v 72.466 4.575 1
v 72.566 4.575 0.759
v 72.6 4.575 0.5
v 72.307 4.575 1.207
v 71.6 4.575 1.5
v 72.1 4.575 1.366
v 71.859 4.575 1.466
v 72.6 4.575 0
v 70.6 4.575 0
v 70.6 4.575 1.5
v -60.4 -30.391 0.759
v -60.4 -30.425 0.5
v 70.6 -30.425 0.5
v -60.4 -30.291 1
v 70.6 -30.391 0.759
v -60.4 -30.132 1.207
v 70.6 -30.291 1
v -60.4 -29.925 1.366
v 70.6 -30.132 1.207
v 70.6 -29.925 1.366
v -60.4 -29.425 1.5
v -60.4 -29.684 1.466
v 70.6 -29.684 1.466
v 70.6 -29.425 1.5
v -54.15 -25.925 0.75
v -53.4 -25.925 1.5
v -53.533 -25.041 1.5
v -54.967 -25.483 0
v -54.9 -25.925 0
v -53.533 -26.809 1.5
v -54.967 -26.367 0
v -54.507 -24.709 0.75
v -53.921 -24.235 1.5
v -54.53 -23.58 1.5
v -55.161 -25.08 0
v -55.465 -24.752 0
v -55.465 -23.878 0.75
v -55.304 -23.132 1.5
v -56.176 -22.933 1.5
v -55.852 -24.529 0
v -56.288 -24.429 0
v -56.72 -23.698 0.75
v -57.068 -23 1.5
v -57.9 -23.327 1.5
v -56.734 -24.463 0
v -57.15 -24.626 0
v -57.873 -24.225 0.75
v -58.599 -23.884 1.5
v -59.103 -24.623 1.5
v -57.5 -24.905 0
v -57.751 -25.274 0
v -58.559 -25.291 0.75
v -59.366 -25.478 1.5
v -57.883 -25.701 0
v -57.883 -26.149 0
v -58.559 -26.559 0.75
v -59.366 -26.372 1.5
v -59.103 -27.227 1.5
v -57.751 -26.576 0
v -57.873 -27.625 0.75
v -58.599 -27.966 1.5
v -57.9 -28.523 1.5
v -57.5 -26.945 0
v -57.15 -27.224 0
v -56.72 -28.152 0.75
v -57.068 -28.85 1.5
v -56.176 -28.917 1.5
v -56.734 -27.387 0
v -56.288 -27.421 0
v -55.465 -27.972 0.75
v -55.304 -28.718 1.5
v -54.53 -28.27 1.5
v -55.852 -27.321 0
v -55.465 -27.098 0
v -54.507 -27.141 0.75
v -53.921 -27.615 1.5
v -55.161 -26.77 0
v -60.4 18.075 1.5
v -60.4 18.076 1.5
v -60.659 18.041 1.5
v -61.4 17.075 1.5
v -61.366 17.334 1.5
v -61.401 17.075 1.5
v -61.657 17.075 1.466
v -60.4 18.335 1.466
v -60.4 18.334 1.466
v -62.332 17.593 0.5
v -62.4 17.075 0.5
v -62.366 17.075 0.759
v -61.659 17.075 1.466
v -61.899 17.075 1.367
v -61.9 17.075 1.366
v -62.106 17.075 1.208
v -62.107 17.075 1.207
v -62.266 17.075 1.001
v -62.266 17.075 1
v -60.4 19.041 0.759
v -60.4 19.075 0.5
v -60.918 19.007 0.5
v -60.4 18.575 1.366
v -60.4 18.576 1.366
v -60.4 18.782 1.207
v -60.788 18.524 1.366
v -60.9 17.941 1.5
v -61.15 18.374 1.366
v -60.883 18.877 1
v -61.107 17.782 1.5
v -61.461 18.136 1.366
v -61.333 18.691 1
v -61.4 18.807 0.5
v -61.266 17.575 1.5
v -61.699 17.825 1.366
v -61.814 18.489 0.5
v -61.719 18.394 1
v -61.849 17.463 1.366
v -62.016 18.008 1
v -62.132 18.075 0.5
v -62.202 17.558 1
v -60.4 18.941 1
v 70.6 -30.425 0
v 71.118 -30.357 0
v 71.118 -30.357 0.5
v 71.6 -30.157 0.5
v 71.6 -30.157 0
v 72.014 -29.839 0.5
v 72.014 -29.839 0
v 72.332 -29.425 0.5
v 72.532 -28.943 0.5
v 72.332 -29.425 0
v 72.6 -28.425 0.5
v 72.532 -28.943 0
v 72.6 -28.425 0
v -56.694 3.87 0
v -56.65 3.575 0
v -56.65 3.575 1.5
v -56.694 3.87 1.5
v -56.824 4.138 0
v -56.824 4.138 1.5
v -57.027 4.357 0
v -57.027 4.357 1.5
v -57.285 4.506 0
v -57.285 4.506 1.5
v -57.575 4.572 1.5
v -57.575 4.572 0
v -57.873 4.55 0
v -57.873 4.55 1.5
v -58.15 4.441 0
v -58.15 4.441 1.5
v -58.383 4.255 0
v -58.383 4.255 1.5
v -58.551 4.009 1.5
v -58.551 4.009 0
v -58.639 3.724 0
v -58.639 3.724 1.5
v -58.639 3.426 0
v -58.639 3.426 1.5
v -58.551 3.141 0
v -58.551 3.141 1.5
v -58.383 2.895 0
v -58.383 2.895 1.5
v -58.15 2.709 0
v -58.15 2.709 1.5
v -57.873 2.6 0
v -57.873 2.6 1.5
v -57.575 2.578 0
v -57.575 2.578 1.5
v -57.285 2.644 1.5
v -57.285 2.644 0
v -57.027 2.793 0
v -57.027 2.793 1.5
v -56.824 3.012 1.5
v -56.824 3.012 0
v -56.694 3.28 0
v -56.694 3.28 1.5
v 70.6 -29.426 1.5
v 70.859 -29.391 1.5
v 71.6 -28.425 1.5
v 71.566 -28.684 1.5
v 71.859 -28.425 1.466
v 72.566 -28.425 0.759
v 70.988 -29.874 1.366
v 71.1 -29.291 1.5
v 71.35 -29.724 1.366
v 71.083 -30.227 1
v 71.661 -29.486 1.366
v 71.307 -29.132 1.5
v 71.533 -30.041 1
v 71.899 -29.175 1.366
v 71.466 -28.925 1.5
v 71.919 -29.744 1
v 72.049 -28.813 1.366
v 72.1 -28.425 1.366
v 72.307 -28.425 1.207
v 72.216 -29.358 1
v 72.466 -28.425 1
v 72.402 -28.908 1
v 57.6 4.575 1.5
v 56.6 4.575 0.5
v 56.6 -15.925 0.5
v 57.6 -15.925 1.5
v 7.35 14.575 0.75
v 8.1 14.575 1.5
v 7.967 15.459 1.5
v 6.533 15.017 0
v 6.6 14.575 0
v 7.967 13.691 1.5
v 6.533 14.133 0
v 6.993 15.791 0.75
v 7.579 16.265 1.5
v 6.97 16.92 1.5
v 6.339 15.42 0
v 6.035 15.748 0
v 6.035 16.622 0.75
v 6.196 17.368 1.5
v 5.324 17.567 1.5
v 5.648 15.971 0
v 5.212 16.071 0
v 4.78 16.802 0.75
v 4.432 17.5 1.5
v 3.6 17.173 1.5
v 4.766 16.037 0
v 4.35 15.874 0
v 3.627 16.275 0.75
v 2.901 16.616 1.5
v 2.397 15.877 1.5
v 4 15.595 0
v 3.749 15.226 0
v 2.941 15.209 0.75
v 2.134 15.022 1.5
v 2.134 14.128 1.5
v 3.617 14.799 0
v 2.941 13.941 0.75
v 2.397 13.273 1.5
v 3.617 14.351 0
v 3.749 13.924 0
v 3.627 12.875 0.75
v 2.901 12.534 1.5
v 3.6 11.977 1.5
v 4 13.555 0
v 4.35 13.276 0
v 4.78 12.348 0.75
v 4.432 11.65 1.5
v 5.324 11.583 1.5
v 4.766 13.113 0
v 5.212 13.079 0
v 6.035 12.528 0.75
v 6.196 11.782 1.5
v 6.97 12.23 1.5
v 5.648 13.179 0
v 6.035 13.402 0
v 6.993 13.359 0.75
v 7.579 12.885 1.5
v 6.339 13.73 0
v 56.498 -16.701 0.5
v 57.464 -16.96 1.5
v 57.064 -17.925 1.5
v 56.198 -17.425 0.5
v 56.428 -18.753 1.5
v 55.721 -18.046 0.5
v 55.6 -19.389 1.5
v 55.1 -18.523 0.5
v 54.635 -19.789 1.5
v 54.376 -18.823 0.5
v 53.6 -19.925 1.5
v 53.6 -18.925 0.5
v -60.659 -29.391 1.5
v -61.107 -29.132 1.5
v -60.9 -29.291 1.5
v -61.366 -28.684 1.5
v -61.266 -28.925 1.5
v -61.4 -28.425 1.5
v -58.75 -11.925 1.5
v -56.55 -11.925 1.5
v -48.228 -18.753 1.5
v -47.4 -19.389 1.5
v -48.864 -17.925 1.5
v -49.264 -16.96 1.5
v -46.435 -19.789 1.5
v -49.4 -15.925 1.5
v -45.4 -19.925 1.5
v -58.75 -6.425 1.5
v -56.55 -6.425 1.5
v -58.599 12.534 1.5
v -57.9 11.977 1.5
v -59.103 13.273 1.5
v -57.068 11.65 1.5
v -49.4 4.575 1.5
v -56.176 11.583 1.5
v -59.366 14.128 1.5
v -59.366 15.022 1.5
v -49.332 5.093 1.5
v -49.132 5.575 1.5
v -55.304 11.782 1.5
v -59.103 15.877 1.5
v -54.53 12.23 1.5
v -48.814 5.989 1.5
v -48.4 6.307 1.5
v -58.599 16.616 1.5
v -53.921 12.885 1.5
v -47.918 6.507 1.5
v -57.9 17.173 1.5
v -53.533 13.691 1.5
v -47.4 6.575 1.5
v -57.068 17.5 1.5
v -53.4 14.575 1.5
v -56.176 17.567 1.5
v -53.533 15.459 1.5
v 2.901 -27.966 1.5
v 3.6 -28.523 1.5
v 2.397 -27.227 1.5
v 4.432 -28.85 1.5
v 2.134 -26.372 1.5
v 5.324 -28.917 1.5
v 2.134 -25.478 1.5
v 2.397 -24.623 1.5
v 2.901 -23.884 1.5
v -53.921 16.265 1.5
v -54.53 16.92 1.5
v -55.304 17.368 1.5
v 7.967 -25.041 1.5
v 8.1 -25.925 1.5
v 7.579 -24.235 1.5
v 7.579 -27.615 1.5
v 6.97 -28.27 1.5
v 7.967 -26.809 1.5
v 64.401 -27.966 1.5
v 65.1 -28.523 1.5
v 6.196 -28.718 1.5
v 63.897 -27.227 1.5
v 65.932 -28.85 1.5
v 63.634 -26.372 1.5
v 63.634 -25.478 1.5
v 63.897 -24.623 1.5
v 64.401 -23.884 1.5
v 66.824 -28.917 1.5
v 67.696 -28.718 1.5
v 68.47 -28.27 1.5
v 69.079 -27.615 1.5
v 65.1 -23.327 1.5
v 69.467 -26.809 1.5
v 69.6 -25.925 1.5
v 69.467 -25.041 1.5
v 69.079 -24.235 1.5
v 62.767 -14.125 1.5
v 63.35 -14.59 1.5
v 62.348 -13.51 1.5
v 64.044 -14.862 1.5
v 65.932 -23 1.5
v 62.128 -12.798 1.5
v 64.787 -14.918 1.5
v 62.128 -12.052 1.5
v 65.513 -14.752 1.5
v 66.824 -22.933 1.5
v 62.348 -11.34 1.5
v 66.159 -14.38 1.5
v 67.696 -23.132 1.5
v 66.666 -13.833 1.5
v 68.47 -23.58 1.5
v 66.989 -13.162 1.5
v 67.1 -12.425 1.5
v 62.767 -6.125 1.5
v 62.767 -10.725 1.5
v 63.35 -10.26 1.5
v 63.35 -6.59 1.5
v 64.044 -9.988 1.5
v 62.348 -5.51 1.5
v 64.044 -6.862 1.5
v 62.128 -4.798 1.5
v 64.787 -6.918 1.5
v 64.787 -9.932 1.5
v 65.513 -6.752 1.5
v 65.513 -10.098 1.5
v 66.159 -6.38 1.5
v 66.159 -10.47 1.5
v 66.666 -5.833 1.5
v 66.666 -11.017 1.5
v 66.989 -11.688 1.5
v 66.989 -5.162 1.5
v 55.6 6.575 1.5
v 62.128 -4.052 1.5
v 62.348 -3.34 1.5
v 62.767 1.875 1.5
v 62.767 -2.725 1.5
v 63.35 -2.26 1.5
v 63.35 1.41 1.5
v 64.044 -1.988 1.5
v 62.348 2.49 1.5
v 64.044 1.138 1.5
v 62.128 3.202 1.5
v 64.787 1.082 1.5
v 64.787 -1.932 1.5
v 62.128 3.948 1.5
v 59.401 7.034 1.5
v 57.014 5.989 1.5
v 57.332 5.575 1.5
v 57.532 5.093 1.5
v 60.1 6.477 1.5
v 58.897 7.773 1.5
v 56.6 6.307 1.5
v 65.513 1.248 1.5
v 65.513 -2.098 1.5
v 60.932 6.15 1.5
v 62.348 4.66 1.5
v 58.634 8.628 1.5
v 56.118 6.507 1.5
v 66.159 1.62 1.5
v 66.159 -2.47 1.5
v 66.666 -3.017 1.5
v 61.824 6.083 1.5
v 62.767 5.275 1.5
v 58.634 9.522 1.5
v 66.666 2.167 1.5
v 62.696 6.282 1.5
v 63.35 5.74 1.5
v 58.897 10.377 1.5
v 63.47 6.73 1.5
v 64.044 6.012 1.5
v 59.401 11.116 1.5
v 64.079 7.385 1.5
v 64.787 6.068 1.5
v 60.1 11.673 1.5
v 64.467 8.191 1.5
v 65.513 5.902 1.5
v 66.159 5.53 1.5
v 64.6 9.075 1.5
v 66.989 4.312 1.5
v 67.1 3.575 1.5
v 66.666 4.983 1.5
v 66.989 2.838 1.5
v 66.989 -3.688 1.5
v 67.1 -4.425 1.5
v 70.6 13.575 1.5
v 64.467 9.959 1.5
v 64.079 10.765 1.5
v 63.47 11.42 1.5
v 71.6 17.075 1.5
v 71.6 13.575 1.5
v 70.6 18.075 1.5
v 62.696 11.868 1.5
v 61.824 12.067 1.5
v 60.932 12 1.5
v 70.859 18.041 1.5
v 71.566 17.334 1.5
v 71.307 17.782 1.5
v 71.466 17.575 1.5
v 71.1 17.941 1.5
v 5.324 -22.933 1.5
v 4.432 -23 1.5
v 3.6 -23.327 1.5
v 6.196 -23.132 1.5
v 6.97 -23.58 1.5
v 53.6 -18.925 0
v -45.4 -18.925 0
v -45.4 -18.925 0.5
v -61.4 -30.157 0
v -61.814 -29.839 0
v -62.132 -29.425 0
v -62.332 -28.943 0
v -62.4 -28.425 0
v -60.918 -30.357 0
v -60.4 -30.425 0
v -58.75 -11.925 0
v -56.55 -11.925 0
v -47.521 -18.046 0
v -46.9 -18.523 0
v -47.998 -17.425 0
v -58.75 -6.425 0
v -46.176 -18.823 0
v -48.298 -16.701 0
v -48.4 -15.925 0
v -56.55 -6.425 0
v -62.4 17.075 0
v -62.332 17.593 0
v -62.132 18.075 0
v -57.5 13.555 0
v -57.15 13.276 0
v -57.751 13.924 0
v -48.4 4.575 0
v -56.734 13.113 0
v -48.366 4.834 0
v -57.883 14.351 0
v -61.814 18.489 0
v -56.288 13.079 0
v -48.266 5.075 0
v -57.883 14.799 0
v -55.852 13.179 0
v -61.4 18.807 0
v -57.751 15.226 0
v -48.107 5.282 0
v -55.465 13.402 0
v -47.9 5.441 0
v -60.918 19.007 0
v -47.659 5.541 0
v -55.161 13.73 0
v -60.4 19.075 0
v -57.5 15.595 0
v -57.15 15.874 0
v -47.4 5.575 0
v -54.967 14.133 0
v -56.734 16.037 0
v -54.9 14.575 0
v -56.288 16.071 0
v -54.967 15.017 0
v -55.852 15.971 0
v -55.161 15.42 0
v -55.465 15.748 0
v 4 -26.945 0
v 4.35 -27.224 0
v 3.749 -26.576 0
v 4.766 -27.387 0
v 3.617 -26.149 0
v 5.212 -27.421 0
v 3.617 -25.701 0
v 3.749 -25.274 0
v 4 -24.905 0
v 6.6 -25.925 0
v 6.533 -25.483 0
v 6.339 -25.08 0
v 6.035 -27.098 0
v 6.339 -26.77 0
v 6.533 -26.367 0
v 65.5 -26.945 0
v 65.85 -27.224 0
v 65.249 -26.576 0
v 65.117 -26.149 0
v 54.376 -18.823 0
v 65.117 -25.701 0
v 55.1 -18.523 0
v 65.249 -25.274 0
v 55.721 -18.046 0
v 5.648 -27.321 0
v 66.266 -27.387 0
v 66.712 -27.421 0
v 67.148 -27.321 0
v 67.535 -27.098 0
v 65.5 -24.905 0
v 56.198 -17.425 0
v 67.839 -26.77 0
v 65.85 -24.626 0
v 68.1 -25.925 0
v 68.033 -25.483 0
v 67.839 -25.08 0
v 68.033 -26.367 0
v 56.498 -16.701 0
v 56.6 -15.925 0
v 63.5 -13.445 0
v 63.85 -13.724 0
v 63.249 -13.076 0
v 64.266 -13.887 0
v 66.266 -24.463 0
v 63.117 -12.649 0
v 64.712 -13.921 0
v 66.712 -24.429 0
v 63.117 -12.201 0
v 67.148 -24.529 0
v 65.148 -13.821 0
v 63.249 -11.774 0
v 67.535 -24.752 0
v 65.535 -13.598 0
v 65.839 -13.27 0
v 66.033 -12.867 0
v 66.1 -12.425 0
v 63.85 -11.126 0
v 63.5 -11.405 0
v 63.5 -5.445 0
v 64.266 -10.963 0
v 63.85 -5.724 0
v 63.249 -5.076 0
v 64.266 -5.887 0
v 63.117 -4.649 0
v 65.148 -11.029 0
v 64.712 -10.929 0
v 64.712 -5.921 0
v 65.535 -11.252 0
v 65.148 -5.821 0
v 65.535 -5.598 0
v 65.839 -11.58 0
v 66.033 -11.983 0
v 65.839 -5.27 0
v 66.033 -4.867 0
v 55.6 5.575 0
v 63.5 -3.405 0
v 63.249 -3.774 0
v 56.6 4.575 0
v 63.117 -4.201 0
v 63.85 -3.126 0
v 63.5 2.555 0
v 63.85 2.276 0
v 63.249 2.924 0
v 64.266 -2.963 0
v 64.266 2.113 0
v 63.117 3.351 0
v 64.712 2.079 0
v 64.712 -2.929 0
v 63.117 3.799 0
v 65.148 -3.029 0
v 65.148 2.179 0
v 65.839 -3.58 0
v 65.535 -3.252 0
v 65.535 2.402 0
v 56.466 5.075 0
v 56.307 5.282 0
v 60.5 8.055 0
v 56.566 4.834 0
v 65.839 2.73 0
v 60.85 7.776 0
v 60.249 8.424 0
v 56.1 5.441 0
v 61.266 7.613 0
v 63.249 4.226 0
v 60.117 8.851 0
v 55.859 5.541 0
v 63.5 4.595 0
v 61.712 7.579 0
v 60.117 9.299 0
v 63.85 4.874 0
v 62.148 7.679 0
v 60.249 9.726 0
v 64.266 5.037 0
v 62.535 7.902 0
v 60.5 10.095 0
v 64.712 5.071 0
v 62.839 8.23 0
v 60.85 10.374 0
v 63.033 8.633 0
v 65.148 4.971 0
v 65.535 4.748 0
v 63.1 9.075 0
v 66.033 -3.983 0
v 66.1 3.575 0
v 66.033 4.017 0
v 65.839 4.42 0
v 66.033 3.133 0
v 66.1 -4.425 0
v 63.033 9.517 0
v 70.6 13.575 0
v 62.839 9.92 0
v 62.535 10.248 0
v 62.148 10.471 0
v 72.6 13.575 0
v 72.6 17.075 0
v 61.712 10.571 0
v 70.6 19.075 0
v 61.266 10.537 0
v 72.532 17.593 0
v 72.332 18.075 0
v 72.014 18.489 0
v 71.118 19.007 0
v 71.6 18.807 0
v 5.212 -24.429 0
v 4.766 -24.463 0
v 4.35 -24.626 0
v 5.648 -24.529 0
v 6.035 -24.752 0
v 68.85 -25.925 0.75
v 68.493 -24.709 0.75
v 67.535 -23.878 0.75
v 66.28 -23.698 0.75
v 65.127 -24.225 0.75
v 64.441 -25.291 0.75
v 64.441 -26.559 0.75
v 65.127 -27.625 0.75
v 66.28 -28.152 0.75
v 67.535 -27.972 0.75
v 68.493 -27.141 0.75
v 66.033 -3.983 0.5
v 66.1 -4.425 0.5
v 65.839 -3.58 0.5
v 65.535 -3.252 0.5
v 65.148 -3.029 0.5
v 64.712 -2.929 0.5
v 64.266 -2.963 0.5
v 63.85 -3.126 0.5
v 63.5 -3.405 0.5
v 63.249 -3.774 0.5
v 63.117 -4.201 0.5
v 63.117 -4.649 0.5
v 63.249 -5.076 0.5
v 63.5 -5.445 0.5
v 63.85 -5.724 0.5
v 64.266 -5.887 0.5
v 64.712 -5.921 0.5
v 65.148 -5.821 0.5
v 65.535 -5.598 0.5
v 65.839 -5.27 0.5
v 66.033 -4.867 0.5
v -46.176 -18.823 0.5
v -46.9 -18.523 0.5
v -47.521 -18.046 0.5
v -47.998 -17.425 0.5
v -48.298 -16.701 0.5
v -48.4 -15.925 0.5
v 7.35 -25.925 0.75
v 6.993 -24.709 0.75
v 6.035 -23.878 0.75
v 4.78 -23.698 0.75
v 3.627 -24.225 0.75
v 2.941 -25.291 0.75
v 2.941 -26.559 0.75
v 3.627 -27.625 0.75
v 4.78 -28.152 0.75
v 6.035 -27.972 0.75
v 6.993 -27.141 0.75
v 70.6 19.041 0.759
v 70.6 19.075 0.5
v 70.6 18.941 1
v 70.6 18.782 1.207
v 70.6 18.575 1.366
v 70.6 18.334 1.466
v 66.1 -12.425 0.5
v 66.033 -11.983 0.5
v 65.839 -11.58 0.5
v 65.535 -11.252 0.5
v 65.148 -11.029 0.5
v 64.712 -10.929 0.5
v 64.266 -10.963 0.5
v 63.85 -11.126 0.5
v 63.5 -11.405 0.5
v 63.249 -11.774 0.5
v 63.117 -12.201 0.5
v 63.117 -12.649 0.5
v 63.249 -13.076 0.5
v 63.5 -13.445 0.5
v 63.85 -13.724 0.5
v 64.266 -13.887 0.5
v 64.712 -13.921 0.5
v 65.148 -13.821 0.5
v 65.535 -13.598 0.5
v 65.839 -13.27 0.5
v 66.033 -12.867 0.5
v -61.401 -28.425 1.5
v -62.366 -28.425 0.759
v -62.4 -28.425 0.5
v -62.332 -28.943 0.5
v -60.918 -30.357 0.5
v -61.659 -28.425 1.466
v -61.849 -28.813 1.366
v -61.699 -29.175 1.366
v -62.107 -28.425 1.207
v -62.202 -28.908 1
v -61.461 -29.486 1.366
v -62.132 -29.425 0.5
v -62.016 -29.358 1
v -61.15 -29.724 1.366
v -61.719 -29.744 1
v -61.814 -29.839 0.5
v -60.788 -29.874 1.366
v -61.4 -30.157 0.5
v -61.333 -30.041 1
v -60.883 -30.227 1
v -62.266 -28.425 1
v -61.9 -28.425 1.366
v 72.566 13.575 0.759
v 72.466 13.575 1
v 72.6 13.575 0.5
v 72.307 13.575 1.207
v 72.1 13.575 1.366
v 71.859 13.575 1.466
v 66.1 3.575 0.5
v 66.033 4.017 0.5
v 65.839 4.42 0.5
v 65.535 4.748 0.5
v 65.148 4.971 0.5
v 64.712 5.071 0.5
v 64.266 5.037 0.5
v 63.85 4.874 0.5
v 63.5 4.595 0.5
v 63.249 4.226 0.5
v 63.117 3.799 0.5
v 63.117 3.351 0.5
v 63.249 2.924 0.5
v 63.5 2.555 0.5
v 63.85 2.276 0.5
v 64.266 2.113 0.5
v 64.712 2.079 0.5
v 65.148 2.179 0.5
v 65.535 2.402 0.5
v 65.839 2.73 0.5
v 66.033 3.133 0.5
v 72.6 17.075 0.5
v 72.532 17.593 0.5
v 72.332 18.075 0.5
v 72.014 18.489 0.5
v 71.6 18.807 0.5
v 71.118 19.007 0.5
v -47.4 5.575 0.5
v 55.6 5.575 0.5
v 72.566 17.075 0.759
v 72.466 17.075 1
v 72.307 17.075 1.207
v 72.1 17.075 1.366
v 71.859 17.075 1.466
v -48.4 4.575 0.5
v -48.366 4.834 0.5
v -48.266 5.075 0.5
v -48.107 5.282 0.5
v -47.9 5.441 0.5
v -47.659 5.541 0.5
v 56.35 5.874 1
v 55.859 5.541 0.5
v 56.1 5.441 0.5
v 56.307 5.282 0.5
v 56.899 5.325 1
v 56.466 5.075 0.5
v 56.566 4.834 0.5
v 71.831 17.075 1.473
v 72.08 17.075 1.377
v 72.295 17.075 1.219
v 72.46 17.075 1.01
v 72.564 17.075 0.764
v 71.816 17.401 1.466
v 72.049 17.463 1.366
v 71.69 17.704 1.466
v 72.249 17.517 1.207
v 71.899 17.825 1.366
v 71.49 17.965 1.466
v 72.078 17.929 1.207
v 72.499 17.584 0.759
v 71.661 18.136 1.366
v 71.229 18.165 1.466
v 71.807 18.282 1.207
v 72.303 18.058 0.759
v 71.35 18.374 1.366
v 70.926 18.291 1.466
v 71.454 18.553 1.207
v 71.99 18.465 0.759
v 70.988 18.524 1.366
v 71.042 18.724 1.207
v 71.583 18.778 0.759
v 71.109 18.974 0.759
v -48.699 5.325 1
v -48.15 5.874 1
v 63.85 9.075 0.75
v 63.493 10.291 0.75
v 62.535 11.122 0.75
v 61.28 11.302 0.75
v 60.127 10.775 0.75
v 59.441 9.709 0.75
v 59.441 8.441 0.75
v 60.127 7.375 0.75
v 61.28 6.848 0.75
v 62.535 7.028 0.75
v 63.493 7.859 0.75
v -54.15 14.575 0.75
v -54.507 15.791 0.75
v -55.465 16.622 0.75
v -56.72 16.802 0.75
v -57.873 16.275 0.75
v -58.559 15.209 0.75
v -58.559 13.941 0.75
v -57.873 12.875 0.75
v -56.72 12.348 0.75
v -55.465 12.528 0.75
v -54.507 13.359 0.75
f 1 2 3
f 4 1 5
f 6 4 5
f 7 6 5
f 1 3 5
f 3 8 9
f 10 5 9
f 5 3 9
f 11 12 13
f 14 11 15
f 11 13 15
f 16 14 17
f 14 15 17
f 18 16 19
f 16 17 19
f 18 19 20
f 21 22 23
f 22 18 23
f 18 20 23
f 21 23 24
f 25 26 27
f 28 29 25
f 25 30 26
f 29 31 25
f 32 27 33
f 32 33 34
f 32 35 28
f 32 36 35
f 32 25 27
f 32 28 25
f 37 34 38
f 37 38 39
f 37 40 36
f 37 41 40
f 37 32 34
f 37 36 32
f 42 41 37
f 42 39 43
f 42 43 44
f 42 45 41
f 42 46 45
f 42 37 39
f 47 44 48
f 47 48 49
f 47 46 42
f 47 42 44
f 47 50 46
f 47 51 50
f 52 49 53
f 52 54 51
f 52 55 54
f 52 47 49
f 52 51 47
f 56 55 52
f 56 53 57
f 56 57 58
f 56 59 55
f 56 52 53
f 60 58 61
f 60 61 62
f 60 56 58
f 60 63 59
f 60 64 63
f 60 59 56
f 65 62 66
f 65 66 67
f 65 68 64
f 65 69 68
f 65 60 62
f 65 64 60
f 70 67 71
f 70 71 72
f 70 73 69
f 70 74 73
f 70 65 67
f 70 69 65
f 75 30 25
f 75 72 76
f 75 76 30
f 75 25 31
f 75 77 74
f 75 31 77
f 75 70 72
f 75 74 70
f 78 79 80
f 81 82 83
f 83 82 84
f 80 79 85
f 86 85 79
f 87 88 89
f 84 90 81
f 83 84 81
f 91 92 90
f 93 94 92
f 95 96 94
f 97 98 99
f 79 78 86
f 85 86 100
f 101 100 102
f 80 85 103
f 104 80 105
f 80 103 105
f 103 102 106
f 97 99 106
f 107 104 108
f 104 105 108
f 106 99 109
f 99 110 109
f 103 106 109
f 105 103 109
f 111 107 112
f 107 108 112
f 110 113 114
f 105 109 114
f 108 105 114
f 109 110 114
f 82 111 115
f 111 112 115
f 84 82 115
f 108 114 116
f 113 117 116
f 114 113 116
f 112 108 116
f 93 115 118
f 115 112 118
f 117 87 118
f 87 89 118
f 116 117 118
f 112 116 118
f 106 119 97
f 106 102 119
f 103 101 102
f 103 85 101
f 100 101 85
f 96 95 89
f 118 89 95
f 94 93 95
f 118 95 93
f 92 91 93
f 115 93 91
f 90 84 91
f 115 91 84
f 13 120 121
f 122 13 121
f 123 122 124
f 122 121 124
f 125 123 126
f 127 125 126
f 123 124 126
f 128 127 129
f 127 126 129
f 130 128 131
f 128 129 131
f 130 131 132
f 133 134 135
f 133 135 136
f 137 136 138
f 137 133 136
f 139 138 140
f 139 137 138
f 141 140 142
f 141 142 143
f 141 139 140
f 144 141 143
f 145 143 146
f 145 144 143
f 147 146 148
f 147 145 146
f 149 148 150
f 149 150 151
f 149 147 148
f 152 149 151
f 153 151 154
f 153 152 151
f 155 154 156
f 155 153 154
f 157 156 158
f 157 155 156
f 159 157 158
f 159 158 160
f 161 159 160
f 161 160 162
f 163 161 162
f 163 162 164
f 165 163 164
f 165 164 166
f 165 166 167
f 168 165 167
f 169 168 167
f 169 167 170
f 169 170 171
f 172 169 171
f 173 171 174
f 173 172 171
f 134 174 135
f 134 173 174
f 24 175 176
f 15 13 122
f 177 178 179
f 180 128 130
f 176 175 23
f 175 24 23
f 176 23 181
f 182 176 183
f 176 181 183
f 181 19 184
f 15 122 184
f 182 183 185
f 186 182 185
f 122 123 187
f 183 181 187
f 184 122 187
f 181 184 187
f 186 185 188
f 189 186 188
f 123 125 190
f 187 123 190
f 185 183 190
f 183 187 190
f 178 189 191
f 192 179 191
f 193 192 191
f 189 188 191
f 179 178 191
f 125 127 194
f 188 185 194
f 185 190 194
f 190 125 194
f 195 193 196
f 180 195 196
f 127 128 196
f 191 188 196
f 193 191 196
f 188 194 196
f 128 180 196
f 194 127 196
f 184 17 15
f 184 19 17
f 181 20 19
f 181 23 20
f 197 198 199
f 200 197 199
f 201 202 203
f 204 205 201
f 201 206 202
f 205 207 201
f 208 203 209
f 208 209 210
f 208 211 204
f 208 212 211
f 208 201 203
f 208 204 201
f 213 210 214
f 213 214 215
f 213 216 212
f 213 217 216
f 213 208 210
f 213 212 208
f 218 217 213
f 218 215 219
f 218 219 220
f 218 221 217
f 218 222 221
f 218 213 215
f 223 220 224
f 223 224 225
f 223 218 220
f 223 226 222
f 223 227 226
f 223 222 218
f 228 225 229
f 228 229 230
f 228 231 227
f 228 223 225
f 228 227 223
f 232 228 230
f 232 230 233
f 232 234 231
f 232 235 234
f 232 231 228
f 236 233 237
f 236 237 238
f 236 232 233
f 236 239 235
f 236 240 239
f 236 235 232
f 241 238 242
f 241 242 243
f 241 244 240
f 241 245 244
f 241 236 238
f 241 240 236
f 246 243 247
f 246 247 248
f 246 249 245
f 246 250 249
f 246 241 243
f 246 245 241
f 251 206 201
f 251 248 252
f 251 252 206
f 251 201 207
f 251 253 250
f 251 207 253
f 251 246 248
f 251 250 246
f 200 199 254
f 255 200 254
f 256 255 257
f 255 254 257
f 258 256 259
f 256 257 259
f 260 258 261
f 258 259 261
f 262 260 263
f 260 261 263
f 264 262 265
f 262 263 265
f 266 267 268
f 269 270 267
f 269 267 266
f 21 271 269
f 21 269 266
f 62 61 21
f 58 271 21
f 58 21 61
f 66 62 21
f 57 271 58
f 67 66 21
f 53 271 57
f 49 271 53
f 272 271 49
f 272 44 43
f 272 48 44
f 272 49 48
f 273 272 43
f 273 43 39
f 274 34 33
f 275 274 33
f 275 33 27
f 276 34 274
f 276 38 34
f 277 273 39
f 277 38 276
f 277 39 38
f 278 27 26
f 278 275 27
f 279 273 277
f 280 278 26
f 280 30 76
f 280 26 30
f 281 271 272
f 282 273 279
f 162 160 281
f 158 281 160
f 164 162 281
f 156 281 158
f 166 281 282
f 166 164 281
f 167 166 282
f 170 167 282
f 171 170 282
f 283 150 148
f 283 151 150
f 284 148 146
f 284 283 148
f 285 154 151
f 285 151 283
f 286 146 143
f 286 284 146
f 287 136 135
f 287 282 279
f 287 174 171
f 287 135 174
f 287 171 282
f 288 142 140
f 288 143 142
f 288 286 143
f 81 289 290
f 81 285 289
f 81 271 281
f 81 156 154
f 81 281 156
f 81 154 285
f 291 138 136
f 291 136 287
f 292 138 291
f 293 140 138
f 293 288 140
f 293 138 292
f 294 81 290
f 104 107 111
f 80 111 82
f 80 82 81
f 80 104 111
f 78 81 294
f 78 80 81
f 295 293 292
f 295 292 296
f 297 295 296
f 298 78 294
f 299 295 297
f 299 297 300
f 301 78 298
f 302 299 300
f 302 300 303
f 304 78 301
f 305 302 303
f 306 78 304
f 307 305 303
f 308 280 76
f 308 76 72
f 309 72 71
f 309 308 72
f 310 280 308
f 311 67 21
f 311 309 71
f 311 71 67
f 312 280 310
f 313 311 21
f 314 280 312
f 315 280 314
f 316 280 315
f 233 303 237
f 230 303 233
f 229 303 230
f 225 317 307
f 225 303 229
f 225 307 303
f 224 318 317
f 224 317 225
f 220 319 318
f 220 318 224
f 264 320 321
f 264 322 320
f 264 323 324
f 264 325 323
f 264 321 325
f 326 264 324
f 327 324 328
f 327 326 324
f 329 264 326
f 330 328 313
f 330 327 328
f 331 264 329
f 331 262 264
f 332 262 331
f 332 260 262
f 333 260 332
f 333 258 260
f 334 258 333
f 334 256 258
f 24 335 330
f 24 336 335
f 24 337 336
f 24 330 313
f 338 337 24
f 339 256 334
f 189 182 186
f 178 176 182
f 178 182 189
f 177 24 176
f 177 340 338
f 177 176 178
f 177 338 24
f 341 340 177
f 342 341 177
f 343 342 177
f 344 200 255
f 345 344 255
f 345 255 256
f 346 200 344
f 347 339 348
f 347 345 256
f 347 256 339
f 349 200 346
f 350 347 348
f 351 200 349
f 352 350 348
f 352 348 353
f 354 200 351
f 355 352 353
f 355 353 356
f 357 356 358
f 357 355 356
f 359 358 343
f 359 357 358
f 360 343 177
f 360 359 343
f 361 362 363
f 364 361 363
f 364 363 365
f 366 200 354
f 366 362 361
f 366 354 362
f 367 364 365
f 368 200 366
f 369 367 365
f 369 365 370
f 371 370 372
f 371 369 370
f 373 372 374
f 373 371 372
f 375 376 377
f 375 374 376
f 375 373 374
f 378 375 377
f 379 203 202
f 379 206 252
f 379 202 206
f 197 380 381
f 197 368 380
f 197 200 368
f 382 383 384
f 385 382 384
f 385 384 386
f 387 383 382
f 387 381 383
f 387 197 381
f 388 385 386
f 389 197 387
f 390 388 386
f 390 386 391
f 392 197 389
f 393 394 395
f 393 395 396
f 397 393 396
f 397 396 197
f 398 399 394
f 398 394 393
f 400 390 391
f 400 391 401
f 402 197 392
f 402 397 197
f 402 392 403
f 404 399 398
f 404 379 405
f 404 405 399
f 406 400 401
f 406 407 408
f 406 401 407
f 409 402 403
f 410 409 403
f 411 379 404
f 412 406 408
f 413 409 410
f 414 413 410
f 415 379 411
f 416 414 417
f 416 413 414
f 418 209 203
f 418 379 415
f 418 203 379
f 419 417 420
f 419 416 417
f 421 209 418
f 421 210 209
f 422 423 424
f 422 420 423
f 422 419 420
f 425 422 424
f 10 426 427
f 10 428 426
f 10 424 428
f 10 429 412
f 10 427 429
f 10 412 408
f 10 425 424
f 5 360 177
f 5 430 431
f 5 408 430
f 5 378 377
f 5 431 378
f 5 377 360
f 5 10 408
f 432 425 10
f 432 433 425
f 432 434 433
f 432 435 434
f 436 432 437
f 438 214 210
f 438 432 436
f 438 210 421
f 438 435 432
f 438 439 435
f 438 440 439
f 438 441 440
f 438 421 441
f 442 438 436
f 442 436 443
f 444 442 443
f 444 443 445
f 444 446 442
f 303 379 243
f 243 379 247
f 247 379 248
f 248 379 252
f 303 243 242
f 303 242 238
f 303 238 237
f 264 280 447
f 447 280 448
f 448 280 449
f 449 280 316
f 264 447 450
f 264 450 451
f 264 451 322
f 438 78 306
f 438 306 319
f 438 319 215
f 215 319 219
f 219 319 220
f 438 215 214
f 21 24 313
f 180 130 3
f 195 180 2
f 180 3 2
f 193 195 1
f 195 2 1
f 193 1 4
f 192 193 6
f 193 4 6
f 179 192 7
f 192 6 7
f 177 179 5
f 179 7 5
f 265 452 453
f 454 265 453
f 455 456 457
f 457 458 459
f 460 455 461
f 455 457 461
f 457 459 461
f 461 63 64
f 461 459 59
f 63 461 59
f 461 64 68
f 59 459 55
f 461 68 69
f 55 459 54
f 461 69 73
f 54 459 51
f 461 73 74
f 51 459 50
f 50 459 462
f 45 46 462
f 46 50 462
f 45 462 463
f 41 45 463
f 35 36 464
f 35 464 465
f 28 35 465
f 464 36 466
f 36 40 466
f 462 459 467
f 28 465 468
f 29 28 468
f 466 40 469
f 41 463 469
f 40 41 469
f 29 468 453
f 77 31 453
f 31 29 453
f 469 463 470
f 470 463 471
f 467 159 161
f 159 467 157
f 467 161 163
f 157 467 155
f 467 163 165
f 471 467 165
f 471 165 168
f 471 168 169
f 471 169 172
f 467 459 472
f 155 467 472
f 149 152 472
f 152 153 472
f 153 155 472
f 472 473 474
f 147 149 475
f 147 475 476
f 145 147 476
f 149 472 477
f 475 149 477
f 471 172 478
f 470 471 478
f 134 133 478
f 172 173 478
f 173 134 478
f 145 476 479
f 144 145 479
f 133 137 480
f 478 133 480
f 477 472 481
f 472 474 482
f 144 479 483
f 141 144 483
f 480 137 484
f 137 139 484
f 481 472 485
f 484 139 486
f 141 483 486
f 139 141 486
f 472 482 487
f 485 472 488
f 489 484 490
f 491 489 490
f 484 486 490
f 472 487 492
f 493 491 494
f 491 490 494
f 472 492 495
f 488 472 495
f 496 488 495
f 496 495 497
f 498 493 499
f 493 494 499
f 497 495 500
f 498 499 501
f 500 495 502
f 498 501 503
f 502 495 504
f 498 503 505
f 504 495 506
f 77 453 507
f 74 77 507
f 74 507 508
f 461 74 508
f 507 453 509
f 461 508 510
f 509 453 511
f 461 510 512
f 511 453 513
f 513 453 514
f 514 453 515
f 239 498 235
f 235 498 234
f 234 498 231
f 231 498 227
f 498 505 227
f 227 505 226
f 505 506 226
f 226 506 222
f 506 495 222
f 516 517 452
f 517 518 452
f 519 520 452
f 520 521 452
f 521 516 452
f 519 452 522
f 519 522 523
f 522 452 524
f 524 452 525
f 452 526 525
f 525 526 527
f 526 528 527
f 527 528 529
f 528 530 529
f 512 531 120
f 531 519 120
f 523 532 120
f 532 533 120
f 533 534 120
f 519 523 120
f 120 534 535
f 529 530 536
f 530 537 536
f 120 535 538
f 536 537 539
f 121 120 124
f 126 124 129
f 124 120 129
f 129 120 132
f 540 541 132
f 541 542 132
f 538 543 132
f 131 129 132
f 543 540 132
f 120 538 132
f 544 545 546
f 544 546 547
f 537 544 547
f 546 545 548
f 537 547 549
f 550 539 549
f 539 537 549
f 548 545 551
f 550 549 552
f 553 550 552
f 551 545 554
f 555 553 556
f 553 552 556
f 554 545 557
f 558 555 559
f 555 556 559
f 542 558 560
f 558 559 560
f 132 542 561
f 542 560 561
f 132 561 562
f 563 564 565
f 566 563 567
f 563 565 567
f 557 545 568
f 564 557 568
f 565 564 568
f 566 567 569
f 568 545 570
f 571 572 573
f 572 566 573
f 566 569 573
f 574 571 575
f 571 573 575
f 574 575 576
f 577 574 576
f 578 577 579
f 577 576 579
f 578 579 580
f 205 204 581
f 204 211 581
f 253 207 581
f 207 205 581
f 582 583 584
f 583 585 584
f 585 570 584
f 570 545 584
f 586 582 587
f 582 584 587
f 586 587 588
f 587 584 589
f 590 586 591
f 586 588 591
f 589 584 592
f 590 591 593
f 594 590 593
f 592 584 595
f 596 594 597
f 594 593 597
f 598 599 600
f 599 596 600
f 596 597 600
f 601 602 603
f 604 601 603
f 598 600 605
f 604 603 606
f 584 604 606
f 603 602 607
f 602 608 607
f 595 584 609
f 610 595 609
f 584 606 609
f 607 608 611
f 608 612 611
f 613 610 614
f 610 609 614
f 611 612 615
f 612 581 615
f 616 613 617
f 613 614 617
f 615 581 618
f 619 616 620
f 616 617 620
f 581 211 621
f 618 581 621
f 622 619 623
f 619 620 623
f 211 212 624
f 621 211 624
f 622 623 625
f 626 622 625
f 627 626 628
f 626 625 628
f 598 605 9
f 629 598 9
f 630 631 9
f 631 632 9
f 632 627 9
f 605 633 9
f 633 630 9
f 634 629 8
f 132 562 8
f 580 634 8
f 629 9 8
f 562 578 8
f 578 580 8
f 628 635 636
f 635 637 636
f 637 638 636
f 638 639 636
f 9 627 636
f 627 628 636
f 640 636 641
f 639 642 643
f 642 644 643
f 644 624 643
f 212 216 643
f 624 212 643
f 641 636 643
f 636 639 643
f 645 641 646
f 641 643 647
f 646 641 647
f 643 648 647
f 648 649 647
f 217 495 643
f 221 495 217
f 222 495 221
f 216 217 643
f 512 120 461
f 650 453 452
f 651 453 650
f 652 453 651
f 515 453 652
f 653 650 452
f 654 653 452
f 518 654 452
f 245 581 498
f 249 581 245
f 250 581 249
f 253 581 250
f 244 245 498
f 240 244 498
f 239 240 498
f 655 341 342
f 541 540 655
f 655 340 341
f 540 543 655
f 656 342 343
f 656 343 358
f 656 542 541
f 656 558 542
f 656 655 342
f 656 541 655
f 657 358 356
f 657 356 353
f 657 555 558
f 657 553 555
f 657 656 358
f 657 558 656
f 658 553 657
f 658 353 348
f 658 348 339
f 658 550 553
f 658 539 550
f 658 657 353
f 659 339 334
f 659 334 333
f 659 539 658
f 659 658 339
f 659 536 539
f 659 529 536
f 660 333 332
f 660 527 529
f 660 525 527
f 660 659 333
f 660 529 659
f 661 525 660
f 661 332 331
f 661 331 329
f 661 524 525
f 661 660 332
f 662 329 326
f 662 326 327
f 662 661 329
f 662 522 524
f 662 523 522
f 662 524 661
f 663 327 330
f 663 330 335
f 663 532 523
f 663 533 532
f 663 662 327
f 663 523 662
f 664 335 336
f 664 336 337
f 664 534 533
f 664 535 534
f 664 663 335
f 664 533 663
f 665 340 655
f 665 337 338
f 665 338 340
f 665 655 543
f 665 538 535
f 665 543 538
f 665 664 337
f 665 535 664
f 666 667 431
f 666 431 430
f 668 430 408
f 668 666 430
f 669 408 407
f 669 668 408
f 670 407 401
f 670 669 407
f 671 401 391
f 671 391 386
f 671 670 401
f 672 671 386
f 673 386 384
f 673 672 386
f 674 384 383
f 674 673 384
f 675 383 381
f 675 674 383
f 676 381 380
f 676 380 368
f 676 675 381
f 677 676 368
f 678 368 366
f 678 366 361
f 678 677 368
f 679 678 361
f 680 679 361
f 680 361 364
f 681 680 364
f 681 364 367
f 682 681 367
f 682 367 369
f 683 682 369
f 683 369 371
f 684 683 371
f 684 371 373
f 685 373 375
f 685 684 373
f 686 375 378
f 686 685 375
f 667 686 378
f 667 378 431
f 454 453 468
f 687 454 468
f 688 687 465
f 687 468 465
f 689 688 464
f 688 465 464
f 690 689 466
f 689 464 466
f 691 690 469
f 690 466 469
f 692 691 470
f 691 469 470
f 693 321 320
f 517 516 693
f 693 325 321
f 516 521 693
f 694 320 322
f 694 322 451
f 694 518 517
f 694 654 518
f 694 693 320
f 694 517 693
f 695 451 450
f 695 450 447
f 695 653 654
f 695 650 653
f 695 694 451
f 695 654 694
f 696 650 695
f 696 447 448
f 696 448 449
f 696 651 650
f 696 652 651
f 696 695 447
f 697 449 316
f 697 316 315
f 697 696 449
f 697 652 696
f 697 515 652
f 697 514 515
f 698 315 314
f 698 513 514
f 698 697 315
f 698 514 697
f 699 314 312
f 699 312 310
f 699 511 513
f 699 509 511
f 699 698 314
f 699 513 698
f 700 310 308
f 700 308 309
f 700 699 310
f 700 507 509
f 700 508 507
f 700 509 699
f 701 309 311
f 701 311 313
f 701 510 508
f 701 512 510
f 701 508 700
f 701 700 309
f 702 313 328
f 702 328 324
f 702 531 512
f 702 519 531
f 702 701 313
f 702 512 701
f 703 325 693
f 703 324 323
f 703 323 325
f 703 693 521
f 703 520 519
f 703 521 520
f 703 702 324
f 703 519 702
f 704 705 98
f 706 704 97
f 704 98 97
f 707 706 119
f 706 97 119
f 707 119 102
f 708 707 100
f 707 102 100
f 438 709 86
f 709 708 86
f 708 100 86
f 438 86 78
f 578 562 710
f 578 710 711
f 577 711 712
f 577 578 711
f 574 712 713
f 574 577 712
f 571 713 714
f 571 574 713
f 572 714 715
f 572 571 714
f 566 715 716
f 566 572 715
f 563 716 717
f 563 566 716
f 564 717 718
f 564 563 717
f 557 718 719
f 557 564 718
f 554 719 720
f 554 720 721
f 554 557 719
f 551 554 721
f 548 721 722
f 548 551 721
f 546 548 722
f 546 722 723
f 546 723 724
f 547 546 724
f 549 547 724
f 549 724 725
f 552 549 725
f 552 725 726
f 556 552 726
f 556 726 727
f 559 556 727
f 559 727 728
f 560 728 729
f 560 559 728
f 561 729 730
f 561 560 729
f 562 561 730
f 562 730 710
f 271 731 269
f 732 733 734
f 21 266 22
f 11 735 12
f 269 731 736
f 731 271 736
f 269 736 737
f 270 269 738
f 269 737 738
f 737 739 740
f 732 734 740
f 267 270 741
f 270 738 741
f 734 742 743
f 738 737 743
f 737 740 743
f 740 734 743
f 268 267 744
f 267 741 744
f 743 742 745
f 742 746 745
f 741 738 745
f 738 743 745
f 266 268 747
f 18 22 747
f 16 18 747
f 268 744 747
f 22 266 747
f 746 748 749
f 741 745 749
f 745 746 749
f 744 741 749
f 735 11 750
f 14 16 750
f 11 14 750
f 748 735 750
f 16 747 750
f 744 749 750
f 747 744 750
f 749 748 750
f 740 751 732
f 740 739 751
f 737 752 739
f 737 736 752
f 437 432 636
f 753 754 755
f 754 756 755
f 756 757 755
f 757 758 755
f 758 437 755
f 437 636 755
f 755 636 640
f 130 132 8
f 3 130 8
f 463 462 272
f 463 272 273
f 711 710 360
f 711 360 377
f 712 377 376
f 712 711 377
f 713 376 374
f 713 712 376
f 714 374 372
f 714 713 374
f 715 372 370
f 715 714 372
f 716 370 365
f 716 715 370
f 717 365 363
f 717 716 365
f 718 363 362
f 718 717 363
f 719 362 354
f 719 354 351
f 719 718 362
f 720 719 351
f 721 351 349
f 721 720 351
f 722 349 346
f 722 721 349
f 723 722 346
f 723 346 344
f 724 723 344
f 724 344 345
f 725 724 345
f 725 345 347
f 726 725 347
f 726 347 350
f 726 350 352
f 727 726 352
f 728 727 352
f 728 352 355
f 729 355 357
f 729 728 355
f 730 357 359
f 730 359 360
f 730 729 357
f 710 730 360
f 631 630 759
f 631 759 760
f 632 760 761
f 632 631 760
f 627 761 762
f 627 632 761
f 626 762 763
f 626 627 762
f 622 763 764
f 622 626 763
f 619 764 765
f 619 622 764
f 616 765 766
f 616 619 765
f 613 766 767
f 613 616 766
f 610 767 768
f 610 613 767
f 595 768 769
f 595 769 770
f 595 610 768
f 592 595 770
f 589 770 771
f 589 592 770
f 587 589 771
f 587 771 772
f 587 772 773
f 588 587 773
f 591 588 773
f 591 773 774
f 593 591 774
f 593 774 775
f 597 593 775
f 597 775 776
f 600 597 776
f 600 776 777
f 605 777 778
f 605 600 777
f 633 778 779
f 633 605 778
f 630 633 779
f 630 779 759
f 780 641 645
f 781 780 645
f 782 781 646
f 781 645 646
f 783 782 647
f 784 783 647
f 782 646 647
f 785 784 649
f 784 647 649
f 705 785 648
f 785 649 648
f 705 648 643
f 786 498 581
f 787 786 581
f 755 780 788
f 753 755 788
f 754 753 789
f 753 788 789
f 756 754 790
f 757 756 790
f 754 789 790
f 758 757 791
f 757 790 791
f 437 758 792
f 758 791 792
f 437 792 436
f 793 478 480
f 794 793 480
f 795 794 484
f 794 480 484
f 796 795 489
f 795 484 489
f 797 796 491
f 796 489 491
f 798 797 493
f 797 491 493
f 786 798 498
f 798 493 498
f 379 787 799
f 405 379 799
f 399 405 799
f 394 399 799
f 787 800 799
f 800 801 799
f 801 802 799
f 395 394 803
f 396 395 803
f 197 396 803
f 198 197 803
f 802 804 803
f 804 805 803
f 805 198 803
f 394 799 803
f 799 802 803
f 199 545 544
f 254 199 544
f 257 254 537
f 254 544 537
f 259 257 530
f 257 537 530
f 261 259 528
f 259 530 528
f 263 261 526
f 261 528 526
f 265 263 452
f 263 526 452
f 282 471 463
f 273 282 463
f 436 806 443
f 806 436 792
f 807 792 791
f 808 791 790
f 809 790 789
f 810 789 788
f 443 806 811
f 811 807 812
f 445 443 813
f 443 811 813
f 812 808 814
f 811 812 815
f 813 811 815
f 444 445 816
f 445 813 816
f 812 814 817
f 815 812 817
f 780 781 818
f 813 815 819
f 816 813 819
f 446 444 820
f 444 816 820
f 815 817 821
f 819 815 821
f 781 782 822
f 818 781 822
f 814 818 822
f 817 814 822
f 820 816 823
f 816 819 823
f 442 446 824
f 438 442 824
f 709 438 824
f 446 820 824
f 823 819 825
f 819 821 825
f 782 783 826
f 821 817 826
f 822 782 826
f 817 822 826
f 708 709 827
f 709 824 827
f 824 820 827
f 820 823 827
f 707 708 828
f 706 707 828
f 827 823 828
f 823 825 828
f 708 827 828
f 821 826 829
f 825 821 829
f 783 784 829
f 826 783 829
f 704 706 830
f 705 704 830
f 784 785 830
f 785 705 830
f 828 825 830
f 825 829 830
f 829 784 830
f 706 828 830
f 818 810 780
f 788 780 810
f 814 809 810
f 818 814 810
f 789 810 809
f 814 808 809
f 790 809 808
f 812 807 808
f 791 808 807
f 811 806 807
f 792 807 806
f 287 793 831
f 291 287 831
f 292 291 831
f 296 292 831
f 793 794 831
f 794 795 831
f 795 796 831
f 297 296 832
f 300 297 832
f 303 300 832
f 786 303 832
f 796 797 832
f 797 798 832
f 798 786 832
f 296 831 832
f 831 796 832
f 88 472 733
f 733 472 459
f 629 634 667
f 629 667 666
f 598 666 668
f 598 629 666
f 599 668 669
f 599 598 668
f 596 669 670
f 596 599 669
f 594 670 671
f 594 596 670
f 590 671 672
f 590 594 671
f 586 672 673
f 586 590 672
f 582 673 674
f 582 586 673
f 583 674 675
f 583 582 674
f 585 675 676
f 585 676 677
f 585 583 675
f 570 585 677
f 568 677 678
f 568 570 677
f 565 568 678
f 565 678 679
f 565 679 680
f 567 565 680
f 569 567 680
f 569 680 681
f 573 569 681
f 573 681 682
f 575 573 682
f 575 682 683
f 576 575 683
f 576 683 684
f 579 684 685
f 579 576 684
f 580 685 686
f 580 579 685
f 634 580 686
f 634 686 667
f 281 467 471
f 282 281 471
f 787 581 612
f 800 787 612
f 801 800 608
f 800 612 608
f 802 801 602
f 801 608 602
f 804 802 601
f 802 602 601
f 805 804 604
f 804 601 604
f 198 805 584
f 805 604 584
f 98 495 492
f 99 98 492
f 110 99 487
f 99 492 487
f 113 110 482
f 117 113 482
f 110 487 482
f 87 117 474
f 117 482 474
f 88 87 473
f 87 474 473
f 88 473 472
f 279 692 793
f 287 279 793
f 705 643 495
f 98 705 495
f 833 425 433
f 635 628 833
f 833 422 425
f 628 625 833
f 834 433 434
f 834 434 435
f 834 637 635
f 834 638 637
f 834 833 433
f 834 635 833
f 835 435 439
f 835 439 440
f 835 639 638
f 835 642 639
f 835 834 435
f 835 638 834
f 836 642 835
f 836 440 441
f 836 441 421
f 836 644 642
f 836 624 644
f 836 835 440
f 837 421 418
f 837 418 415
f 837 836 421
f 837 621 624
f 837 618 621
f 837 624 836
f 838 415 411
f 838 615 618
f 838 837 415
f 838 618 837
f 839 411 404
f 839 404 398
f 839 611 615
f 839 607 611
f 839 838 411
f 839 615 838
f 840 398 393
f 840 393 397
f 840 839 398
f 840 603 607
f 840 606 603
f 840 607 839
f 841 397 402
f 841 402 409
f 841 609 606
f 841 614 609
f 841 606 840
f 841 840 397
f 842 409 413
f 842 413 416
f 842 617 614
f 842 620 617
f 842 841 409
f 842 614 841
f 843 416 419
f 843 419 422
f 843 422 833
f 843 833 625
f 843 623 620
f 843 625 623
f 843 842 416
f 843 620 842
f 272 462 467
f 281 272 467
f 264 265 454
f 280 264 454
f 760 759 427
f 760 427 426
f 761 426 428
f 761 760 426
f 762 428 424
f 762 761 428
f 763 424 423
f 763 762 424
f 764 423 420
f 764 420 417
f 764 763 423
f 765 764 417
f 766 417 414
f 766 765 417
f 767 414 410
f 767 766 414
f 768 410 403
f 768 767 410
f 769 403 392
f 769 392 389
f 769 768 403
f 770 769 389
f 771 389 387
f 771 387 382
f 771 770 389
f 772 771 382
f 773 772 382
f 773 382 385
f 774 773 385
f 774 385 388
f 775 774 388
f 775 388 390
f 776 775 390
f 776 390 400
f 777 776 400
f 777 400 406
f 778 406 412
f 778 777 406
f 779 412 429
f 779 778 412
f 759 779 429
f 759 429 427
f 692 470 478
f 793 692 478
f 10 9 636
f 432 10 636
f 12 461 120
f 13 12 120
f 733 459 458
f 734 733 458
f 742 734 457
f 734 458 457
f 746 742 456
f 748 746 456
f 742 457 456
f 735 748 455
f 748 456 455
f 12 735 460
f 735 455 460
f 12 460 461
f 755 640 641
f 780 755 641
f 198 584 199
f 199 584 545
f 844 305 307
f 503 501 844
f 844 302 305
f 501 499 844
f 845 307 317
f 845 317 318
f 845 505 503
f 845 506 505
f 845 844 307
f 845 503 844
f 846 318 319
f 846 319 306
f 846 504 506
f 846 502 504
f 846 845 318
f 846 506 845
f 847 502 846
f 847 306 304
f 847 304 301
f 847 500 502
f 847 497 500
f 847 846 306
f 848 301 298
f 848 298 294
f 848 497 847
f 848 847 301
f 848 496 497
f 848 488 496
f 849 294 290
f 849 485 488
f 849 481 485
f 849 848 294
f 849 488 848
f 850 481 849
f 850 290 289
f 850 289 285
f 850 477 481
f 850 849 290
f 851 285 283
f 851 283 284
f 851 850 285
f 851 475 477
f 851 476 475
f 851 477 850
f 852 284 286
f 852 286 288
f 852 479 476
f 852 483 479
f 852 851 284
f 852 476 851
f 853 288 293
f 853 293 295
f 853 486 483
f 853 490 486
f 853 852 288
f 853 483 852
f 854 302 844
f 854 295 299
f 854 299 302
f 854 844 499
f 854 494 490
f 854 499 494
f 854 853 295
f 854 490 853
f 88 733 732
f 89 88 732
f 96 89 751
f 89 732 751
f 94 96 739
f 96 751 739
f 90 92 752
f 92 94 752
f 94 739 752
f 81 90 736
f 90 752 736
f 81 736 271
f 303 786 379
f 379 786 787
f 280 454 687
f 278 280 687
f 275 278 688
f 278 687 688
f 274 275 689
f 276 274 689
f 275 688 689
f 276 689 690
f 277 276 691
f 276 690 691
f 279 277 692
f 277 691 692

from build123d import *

# Parameters (mm, degrees)
F0_W         = 112.5
F0_H         = 7
F0_R         = 1.5
F0_W_2       = 135
F0_W_3       = 2
F0_H_2       = 2
F0_H_3       = 9
F0_W_4       = 5.5
F0_R_2       = 1
F0_W_5       = 2.2
F0_H_4       = 3.5
F0_H_5       = 9.5
F1_DEPTH     = 1.5
F2_R         = 1
F3_T1_DEPTH  = 6.5
F3_T4_ANGLE  = 90
F3_T6_ANGLE  = 90
F3_T8_ANGLE  = 90
F3_T10_ANGLE = 90
F4_SIZE      = 1
F5_SIZE      = 1
F6_SIZE      = 1.49999


# Not quite as in the source:
# - a fillet or chamfer that OpenCascade refuses, or shapes differently, is made with other operations: its cross-section is extruded or revolved along the edge and cut away or added
# - a fillet or chamfer is up to 0.001 mm smaller than in the source, because OpenCascade refuses the exact size
# - a feature names something its author has since deleted; it is built from what else it names


with BuildPart() as f1:
    # F0 (on Top) → F1 (new body)
    with BuildSketch(Plane.XY):
        Polygon((54.1, 8.075), (54.1, 17.075), (52.1, 17.075), (52.1, 10.075), (-60.4, 10.075), (-60.4, 8.075), (-54.9, 8.075), align=None)
        Polygon((-60.4, 17.075), (52.1, 17.075), (52.1, 19.075), (-62.4, 19.075), (-62.4, 10.075), (-60.4, 10.075), align=None)
        with Locations((-4.15, 13.575)):
            Rectangle(F0_W, F0_H)
        with Locations((-56.4, 14.575)):
            Circle(F0_R, mode=Mode.SUBTRACT)
        with Locations((5.1, 14.575)):
            Circle(F0_R, mode=Mode.SUBTRACT)
        Polygon((54.1, 17.075), (70.6, 17.075), (70.6, 13.575), (72.6, 13.575), (72.6, 19.075), (52.1, 19.075), (52.1, 17.075), align=None)
        Polygon((70.6, 13.575), (70.6, 17.075), (54.1, 17.075), (54.1, 8.075), (-54.9, 8.075), (-54.9, -0.925), (-54.9, -2.925), (-54.9, -21.425), (70.6, -21.425), (70.6, 4.575), align=None)
        with BuildLine():
            Line((56.6, 4.575), (56.6, -15.925))
            ThreePointArc((56.6, -15.925), (55.7213203436, -18.0463203436), (53.6, -18.925))
            Line((53.6, -18.925), (-45.4, -18.925))
            ThreePointArc((-45.4, -18.925), (-47.5213203436, -18.0463203436), (-48.4, -15.925))
            Line((-48.4, -15.925), (-48.4, 4.575))
            ThreePointArc((-48.4, 4.575), (-48.1071067812, 5.2821067812), (-47.4, 5.575))
            Line((-47.4, 5.575), (55.6, 5.575))
            ThreePointArc((55.6, 5.575), (56.3071067812, 5.2821067812), (56.6, 4.575))
        make_face(mode=Mode.SUBTRACT)
        with Locations((64.6, -12.425)):
            Circle(F0_R, mode=Mode.SUBTRACT)
        with Locations((64.6, -4.425)):
            Circle(F0_R, mode=Mode.SUBTRACT)
        with Locations((64.6, 3.575)):
            Circle(F0_R, mode=Mode.SUBTRACT)
        with Locations((61.6, 9.075)):
            Circle(F0_R, mode=Mode.SUBTRACT)
        Polygon((72.6, 4.575), (70.6, 4.575), (70.6, -21.425), (-54.9, -21.425), (-56.55, -21.425), (-58.75, -21.425), (-60.4, -21.425), (-60.4, -2.925), (-62.4, -2.925), (-62.4, -23.425), (72.6, -23.425), align=None)
        with Locations((5.1, -26.925)):
            Rectangle(F0_W_2, F0_H)
        with Locations((-56.4, -25.925)):
            Circle(F0_R, mode=Mode.SUBTRACT)
        with Locations((5.1, -25.925)):
            Circle(F0_R, mode=Mode.SUBTRACT)
        with Locations((66.6, -25.925)):
            Circle(F0_R, mode=Mode.SUBTRACT)
        with Locations((-61.4, 9.075)):
            Rectangle(F0_W_3, F0_H_2)
        with Locations((-61.4, 3.575)):
            Rectangle(F0_W_3, F0_H_3)
        with Locations((-61.4, -1.925)):
            Rectangle(F0_W_3, F0_H_2)
        with Locations((-57.65, 3.575)):
            Rectangle(F0_W_4, F0_H_3)
        with Locations((-57.65, 3.575)):
            Circle(F0_R_2, mode=Mode.SUBTRACT)
        Polygon((-54.9, -2.925), (-54.9, -0.925), (-60.4, -0.925), (-60.4, -2.925), (-58.75, -2.925), (-56.55, -2.925), align=None)
        with Locations((-57.65, -4.675)):
            Rectangle(F0_W_5, F0_H_4)
        Polygon((-56.55, -21.425), (-54.9, -21.425), (-54.9, -2.925), (-56.55, -2.925), (-56.55, -6.425), (-56.55, -11.925), align=None)
        Polygon((-58.75, -2.925), (-60.4, -2.925), (-60.4, -21.425), (-58.75, -21.425), (-58.75, -11.925), (-58.75, -6.425), align=None)
        with Locations((-57.65, -16.675)):
            Rectangle(F0_W_5, F0_H_5)
    extrude(amount=F1_DEPTH)

    # F2
    f2_edges = [f1.edges().sort_by_distance(p)[0] for p in [
        (-62.4, -5.675, 1.5),
        (5.1, 19.075, 1.5),
        (72.6, 16.325, 1.5),
        (72.6, -12.925, 1.5),
        (5.1, -30.425, 1.5),
    ]]
    fillet(f2_edges, radius=F2_R)

    # F3: fillet of radius 2 on 4 edges, made by hand

    # F3_s2 → F3_t1 (cut)
    with BuildSketch(Plane.XY.offset(-5)):
        with BuildLine():
            ThreePointArc((-60.4, 19.075), (-61.8142135624, 18.4892135624), (-62.4, 17.075))
            Line((-62.4, 17.075), (-62.4, 19.075))
            Line((-62.4, 19.075), (-60.4, 19.075))
        make_face()
        with BuildLine():
            ThreePointArc((72.6, 17.075), (72.0142135624, 18.4892135624), (70.6, 19.075))
            Line((70.6, 19.075), (72.6, 19.075))
            Line((72.6, 19.075), (72.6, 17.075))
        make_face()
        with BuildLine():
            ThreePointArc((70.6, -30.425), (72.0142135624, -29.8392135624), (72.6, -28.425))
            Line((72.6, -28.425), (72.6, -30.425))
            Line((72.6, -30.425), (70.6, -30.425))
        make_face()
        with BuildLine():
            ThreePointArc((-62.4, -28.425), (-61.8142135624, -29.8392135624), (-60.4, -30.425))
            Line((-60.4, -30.425), (-62.4, -30.425))
            Line((-62.4, -30.425), (-62.4, -28.425))
        make_face()
    extrude(amount=F3_T1_DEPTH, mode=Mode.SUBTRACT)

    # F3_s3 → F3_t4 (revolve, cut)
    with BuildSketch(Plane.XZ.offset(28.425)):
        with BuildLine():
            ThreePointArc((-61.4, 1.5), (-62.1071067812, 1.2071067812), (-62.4, 0.5))
            Line((-62.4, 0.5), (-62.4, 1.5))
            Line((-62.4, 1.5), (-61.4, 1.5))
        make_face()
    revolve(axis=Axis((-60.4, -28.425, 1.5), (0, 0, 1)), revolution_arc=F3_T4_ANGLE, mode=Mode.SUBTRACT)

    # F3_s5 → F3_t6 (revolve, cut)
    with BuildSketch(Plane.YZ.offset(70.6)):
        with BuildLine():
            ThreePointArc((-29.425, 1.5), (-30.1321067812, 1.2071067812), (-30.425, 0.5))
            Line((-30.425, 0.5), (-30.425, 1.5))
            Line((-30.425, 1.5), (-29.425, 1.5))
        make_face()
    revolve(axis=Axis((70.6, -28.425, 1.5), (0, 0, 1)), revolution_arc=F3_T6_ANGLE, mode=Mode.SUBTRACT)

    # F3_s7 → F3_t8 (revolve, cut)
    with BuildSketch(Plane.XZ.offset(-17.075)):
        with BuildLine():
            ThreePointArc((71.6, 1.5), (72.3071067812, 1.2071067812), (72.6, 0.5))
            Line((72.6, 0.5), (72.6, 1.5))
            Line((72.6, 1.5), (71.6, 1.5))
        make_face()
    revolve(axis=Axis((70.6, 17.075, 1.5), (0, 0, 1)), revolution_arc=F3_T8_ANGLE, mode=Mode.SUBTRACT)

    # F3_s9 → F3_t10 (revolve, cut)
    with BuildSketch(Plane.YZ.offset(-60.4)):
        with BuildLine():
            ThreePointArc((18.075, 1.5), (18.7821067812, 1.2071067812), (19.075, 0.5))
            Line((19.075, 0.5), (19.075, 1.5))
            Line((19.075, 1.5), (18.075, 1.5))
        make_face()
    revolve(axis=Axis((-60.4, 17.075, 1.5), (0, 0, 1)), revolution_arc=F3_T10_ANGLE, mode=Mode.SUBTRACT)

    # F4
    f4_edges = [f1.edges().sort_by_distance(p)[0] for p in [
        (4.1, 5.575, 1.5),
        (55.72132, -18.04632, 1.5),
        (56.6, -5.675, 1.5),
        (56.307107, 5.282107, 1.5),
    ]]
    chamfer(f4_edges, length=F4_SIZE)

    # F5
    f5_edges = [f1.edges().sort_by_distance(p)[0] for p in [
        (63.1, 3.575, 1.5),
        (63.1, -4.425, 1.5),
        (63.1, -12.425, 1.5),
    ]]
    chamfer(f5_edges, length=F5_SIZE)

    # F6 (size 1.5 in the source; OpenCascade refuses exactly that, so slightly less here)
    f6_edges = [f1.edges().sort_by_distance(p)[0] for p in [
        (3.6, 14.575, 1.5),
        (60.1, 9.075, 1.5),
        (65.1, -25.925, 1.5),
        (3.6, -25.925, 1.5),
        (-57.9, -25.925, 1.5),
        (-57.9, 14.575, 1.5),
    ]]
    chamfer(f6_edges, length=F6_SIZE)


solid = f1.part
